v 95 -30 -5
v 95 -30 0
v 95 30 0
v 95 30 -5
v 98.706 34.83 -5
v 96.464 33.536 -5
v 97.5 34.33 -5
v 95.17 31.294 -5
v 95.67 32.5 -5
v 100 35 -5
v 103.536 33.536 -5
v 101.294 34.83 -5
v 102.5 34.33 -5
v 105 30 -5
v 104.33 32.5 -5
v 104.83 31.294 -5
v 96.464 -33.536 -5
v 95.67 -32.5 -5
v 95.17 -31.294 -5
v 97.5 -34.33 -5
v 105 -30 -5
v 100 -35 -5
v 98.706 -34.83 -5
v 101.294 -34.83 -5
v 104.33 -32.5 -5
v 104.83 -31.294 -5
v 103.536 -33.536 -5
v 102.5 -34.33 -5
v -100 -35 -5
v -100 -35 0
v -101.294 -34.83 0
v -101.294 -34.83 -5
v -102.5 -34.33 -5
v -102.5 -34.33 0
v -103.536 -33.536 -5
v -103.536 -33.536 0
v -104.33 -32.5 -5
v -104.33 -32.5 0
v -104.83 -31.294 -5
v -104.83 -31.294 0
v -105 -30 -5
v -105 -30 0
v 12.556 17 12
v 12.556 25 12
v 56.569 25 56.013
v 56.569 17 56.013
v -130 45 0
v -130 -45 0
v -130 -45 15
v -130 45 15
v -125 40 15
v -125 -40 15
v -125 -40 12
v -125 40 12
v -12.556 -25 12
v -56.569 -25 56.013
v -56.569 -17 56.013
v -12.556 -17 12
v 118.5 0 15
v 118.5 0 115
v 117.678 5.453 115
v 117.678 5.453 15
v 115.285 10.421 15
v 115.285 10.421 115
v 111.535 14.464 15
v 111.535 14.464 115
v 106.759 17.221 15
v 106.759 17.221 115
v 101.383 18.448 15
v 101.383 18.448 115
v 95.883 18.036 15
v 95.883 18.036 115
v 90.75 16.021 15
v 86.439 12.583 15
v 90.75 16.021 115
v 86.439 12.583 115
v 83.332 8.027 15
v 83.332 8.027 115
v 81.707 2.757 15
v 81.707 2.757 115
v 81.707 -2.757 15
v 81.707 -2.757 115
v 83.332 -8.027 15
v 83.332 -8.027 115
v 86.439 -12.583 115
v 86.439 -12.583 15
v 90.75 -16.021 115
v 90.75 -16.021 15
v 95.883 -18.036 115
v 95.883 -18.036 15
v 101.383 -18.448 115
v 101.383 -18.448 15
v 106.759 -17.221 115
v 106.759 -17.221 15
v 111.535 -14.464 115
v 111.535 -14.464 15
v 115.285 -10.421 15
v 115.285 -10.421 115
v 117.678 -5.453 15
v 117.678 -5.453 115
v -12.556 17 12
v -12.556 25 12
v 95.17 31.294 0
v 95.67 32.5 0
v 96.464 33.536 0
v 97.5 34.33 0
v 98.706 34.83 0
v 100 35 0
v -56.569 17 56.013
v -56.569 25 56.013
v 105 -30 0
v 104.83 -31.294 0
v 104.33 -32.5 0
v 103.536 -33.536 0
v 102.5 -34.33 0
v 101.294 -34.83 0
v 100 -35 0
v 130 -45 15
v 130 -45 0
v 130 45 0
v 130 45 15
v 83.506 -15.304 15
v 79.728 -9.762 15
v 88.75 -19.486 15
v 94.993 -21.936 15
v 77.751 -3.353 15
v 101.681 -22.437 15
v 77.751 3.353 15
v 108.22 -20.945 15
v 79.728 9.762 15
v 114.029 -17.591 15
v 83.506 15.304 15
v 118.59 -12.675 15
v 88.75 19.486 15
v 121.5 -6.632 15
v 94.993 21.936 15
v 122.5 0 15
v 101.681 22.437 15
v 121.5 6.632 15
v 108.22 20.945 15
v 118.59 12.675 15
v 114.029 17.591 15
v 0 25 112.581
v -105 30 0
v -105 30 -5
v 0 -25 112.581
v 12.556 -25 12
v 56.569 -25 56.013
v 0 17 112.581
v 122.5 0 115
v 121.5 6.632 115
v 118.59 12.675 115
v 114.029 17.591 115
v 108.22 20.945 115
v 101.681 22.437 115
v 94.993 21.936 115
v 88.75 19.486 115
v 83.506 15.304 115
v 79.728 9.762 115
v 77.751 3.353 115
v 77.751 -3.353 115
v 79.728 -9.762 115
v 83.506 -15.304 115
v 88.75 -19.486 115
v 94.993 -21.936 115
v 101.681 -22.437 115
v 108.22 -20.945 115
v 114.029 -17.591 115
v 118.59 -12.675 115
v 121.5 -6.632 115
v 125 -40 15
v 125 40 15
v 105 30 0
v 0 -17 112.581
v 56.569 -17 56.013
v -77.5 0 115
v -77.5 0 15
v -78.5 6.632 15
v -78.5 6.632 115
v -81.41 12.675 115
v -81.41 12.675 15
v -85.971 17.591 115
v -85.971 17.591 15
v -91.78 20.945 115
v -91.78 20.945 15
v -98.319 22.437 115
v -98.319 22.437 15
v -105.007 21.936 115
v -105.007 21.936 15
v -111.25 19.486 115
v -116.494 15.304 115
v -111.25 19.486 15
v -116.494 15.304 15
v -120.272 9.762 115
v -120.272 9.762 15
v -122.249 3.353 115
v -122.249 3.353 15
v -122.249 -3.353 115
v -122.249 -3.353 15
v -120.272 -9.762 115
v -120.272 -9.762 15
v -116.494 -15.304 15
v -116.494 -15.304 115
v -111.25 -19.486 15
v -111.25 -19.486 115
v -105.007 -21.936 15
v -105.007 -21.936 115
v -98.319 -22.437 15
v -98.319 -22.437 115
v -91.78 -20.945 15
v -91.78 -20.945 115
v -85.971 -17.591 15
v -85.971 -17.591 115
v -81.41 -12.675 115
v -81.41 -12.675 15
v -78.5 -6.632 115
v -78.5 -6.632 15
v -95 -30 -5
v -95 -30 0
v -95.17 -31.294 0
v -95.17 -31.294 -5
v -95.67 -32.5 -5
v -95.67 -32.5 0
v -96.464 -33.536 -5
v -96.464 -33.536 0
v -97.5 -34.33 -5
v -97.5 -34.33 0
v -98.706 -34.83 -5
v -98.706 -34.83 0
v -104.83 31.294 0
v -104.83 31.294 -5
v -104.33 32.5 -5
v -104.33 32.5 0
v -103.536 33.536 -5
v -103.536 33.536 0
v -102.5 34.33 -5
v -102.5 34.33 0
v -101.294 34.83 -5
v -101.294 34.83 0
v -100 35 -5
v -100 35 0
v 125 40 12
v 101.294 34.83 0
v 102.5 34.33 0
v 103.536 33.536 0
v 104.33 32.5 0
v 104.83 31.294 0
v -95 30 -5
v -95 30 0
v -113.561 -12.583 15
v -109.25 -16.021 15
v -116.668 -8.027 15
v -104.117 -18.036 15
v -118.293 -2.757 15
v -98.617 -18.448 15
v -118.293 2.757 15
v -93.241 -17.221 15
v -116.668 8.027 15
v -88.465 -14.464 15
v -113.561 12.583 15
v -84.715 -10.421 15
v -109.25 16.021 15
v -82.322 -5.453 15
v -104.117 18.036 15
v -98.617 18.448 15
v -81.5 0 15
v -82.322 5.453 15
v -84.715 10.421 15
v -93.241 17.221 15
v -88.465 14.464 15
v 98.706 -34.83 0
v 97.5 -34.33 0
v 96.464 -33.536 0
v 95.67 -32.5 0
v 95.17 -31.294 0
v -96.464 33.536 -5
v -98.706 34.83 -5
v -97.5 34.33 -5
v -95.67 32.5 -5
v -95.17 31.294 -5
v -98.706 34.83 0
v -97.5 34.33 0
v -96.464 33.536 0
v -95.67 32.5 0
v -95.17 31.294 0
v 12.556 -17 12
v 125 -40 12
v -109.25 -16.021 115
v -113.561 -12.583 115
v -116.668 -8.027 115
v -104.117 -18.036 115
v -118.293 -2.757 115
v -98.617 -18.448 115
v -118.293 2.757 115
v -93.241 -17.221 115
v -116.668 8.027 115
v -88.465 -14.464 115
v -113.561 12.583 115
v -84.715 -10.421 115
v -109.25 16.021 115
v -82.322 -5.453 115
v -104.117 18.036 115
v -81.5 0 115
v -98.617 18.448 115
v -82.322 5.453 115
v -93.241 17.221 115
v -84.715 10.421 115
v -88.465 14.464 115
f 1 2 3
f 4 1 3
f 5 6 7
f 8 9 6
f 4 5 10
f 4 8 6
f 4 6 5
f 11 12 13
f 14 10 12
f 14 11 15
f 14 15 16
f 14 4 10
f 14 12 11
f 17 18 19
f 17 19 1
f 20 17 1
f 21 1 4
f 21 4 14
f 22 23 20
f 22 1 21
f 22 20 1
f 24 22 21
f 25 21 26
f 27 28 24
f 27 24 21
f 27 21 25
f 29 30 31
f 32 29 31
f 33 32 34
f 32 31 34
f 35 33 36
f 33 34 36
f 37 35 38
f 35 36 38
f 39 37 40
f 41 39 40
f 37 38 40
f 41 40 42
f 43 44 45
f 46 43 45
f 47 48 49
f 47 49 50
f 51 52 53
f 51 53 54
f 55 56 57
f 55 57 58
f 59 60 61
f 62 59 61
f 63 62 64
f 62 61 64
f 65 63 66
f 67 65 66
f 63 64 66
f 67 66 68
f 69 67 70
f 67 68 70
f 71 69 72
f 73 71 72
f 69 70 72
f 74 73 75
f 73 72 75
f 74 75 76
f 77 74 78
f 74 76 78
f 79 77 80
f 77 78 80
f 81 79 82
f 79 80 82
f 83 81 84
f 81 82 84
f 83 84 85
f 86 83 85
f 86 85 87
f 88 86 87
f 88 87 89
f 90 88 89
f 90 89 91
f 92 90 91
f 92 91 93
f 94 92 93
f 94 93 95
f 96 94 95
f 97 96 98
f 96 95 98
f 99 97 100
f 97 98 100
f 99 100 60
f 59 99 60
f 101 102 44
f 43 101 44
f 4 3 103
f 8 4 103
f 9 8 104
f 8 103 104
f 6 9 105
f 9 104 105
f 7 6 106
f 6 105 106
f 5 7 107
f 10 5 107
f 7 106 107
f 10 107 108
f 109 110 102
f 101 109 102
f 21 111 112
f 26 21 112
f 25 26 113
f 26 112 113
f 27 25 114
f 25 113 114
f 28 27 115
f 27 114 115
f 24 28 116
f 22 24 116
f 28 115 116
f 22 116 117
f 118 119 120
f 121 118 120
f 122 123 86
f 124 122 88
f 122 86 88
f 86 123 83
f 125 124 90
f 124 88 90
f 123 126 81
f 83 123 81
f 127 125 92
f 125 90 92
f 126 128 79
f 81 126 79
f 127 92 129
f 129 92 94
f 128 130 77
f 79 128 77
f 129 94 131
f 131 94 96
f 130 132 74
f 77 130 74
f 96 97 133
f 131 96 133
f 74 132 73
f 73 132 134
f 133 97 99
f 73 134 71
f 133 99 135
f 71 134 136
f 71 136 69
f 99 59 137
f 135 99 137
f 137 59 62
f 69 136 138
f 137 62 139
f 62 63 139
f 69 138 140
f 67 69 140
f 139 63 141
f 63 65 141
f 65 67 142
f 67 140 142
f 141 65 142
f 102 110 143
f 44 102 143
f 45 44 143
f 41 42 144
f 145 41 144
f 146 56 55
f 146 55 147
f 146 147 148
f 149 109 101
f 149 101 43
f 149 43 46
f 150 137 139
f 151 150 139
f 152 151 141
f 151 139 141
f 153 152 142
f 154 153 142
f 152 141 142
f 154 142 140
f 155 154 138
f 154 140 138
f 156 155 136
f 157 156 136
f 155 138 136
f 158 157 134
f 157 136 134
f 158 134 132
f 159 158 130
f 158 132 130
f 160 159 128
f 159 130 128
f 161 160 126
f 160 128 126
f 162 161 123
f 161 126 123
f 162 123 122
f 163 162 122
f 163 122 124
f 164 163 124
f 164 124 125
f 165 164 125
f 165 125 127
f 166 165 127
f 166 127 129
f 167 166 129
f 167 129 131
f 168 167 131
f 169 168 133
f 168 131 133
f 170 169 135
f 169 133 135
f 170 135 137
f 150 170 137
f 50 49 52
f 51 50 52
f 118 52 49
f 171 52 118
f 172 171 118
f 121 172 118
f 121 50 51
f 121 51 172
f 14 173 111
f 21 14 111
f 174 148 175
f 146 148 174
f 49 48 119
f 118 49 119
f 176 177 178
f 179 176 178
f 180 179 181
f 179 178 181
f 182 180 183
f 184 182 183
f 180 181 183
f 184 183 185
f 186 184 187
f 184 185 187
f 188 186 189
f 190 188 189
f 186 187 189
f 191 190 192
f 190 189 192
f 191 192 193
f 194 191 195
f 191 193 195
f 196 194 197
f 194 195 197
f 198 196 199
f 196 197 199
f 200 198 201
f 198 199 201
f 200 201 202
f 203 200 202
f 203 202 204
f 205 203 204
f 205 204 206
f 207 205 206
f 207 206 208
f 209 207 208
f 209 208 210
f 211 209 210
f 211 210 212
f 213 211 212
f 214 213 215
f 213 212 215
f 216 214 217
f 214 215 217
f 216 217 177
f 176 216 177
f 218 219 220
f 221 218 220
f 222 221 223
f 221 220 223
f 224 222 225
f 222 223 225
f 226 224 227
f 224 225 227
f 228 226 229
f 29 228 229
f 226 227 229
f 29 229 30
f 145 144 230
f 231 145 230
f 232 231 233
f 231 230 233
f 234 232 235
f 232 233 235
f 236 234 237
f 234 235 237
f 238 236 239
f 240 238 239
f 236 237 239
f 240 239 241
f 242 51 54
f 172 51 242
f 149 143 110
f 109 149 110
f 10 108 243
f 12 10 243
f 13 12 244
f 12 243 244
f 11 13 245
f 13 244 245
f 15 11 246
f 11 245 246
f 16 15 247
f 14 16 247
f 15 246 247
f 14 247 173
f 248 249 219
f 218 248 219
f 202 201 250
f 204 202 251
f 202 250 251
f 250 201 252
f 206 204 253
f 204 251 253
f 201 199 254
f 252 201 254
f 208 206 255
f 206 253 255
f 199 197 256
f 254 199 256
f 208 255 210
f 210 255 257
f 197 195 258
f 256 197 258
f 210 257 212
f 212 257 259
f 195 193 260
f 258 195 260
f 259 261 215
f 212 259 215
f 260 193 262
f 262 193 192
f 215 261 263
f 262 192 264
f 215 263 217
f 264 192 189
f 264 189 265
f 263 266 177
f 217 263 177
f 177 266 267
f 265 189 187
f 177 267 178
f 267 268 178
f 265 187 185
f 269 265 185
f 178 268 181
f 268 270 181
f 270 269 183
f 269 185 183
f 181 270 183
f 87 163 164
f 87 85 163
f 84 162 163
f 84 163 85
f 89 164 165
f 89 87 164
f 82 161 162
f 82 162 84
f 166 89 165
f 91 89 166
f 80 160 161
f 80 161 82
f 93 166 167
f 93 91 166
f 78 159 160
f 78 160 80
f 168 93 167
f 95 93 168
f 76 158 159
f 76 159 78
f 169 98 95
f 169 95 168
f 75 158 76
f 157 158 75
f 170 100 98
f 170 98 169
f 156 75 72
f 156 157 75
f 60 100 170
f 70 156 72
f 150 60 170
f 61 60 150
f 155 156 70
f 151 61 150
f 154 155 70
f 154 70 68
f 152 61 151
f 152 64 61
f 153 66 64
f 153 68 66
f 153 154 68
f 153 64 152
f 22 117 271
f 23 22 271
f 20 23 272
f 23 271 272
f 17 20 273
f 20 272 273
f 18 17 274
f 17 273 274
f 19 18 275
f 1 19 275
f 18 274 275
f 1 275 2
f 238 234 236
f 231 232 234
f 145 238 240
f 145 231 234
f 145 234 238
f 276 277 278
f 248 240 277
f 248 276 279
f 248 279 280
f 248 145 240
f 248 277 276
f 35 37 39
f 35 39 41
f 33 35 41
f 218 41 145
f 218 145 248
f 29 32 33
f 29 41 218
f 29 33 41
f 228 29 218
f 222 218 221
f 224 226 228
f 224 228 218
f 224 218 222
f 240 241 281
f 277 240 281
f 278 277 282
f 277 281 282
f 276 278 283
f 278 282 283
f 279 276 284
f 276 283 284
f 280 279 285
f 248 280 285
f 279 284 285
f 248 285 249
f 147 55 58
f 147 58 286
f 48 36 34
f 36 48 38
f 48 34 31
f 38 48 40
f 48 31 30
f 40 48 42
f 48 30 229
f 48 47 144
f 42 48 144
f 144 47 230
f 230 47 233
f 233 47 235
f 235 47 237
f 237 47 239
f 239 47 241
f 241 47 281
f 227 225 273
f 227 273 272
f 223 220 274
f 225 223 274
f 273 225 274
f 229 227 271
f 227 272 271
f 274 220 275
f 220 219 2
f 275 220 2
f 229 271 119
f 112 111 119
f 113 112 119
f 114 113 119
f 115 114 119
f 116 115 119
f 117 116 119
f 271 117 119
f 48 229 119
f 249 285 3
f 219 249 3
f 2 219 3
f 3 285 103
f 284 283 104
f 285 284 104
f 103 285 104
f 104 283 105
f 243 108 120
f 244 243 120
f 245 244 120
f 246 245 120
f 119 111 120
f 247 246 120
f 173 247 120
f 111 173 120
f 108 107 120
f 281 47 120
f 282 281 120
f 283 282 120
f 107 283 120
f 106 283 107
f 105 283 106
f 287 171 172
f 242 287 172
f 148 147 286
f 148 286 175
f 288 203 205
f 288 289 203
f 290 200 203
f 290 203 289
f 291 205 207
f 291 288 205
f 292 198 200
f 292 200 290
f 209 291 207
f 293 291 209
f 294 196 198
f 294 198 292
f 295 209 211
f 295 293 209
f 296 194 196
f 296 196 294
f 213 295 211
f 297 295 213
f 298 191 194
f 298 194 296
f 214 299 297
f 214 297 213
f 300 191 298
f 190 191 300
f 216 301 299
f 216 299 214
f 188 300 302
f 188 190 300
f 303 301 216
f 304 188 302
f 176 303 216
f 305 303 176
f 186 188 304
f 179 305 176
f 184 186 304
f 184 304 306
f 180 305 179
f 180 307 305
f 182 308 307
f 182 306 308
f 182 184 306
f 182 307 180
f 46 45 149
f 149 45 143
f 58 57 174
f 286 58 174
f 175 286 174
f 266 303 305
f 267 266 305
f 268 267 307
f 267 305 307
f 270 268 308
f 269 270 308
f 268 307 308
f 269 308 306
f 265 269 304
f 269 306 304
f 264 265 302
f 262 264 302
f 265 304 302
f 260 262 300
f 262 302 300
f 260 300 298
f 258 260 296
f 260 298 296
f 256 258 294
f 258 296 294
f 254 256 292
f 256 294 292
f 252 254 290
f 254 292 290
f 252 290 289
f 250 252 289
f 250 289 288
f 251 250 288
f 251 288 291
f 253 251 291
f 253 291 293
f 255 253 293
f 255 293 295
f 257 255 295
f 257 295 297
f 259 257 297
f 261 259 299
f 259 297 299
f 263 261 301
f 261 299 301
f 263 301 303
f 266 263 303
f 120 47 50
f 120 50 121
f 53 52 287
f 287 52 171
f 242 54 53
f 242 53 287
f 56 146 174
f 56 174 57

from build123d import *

# Parameters (mm, degrees)
F0_W      = 260
F0_H      = 90
F1_DEPTH  = 15
F2_R      = 22.5
F3_DEPTH  = 100
F4_R      = 18.5
F5_DEPTH  = 100
F7_DEPTH  = 5
F8_W      = 250
F8_H      = 80
F9_DEPTH  = 3
F13_DEPTH = 8
F15_DEPTH = 8


with BuildPart() as f1:
    # F0 (on Top) → F1 (new body)
    with BuildSketch(Plane.XY):
        Rectangle(F0_W, F0_H)
    extrude(amount=F1_DEPTH)

    # F2 (on face) → F3 (join)
    with BuildSketch(Plane.XY.offset(15)):
        with Locations((-100, 0)):
            Circle(F2_R)
        with Locations((100, 0)):
            Circle(F2_R)
    extrude(amount=F3_DEPTH)

    # F4 (on face) → F5 (cut)
    with BuildSketch(Plane.XY.offset(115)):
        with Locations((-100, 0)):
            Circle(F4_R)
        with Locations((100, 0)):
            Circle(F4_R)
    extrude(amount=-F5_DEPTH, mode=Mode.SUBTRACT)

    # F6 (on face) → F7 (join)
    with BuildSketch(Plane(origin=(0, 0, 0), x_dir=(1, 0, 0), z_dir=(0, 0, -1))):
        with BuildLine():
            Line((-95, -30), (-95, 30))
            ThreePointArc((-95, 30), (-96.464466, 33.535534), (-100, 35))
            ThreePointArc((-100, 35), (-103.535534, 33.535534), (-105, 30))
            Line((-105, 30), (-105, -30))
            ThreePointArc((-105, -30), (-103.535534, -33.535534), (-100, -35))
            ThreePointArc((-100, -35), (-96.464466, -33.535534), (-95, -30))
        make_face()
        with BuildLine():
            Line((105, -30), (105, 30))
            ThreePointArc((105, 30), (103.535534, 33.535534), (100, 35))
            ThreePointArc((100, 35), (96.464466, 33.535534), (95, 30))
            Line((95, 30), (95, -30))
            ThreePointArc((95, -30), (96.464466, -33.535534), (100, -35))
            ThreePointArc((100, -35), (103.535534, -33.535534), (105, -30))
        make_face()
    extrude(amount=F7_DEPTH)

    # F8 (on face) → F9 (cut)
    with BuildSketch(Plane.XY.offset(15)):
        Rectangle(F8_W, F8_H)
    extrude(amount=-F9_DEPTH, mode=Mode.SUBTRACT)


with BuildPart() as f13:
    # F12 (on offset) → F13 (new body)
    with BuildSketch(Plane.XZ.offset(25)):
        Polygon((-56.568542, 56.012582), (-12.55596, 12), (12.55596, 12), (56.568542, 56.012582), (0, 112.581125), align=None)
    extrude(amount=-F13_DEPTH)


with BuildPart() as f15:
    # F14 (on offset) → F15 (new body)
    with BuildSketch(Plane.XZ.offset(-25)):
        Polygon((-56.568542, 56.012542), (-12.556, 12), (12.556, 12), (56.568542, 56.012542), (0, 112.581085), align=None)
    extrude(amount=F15_DEPTH)


solid = Compound([f1.part, f13.part, f15.part])
